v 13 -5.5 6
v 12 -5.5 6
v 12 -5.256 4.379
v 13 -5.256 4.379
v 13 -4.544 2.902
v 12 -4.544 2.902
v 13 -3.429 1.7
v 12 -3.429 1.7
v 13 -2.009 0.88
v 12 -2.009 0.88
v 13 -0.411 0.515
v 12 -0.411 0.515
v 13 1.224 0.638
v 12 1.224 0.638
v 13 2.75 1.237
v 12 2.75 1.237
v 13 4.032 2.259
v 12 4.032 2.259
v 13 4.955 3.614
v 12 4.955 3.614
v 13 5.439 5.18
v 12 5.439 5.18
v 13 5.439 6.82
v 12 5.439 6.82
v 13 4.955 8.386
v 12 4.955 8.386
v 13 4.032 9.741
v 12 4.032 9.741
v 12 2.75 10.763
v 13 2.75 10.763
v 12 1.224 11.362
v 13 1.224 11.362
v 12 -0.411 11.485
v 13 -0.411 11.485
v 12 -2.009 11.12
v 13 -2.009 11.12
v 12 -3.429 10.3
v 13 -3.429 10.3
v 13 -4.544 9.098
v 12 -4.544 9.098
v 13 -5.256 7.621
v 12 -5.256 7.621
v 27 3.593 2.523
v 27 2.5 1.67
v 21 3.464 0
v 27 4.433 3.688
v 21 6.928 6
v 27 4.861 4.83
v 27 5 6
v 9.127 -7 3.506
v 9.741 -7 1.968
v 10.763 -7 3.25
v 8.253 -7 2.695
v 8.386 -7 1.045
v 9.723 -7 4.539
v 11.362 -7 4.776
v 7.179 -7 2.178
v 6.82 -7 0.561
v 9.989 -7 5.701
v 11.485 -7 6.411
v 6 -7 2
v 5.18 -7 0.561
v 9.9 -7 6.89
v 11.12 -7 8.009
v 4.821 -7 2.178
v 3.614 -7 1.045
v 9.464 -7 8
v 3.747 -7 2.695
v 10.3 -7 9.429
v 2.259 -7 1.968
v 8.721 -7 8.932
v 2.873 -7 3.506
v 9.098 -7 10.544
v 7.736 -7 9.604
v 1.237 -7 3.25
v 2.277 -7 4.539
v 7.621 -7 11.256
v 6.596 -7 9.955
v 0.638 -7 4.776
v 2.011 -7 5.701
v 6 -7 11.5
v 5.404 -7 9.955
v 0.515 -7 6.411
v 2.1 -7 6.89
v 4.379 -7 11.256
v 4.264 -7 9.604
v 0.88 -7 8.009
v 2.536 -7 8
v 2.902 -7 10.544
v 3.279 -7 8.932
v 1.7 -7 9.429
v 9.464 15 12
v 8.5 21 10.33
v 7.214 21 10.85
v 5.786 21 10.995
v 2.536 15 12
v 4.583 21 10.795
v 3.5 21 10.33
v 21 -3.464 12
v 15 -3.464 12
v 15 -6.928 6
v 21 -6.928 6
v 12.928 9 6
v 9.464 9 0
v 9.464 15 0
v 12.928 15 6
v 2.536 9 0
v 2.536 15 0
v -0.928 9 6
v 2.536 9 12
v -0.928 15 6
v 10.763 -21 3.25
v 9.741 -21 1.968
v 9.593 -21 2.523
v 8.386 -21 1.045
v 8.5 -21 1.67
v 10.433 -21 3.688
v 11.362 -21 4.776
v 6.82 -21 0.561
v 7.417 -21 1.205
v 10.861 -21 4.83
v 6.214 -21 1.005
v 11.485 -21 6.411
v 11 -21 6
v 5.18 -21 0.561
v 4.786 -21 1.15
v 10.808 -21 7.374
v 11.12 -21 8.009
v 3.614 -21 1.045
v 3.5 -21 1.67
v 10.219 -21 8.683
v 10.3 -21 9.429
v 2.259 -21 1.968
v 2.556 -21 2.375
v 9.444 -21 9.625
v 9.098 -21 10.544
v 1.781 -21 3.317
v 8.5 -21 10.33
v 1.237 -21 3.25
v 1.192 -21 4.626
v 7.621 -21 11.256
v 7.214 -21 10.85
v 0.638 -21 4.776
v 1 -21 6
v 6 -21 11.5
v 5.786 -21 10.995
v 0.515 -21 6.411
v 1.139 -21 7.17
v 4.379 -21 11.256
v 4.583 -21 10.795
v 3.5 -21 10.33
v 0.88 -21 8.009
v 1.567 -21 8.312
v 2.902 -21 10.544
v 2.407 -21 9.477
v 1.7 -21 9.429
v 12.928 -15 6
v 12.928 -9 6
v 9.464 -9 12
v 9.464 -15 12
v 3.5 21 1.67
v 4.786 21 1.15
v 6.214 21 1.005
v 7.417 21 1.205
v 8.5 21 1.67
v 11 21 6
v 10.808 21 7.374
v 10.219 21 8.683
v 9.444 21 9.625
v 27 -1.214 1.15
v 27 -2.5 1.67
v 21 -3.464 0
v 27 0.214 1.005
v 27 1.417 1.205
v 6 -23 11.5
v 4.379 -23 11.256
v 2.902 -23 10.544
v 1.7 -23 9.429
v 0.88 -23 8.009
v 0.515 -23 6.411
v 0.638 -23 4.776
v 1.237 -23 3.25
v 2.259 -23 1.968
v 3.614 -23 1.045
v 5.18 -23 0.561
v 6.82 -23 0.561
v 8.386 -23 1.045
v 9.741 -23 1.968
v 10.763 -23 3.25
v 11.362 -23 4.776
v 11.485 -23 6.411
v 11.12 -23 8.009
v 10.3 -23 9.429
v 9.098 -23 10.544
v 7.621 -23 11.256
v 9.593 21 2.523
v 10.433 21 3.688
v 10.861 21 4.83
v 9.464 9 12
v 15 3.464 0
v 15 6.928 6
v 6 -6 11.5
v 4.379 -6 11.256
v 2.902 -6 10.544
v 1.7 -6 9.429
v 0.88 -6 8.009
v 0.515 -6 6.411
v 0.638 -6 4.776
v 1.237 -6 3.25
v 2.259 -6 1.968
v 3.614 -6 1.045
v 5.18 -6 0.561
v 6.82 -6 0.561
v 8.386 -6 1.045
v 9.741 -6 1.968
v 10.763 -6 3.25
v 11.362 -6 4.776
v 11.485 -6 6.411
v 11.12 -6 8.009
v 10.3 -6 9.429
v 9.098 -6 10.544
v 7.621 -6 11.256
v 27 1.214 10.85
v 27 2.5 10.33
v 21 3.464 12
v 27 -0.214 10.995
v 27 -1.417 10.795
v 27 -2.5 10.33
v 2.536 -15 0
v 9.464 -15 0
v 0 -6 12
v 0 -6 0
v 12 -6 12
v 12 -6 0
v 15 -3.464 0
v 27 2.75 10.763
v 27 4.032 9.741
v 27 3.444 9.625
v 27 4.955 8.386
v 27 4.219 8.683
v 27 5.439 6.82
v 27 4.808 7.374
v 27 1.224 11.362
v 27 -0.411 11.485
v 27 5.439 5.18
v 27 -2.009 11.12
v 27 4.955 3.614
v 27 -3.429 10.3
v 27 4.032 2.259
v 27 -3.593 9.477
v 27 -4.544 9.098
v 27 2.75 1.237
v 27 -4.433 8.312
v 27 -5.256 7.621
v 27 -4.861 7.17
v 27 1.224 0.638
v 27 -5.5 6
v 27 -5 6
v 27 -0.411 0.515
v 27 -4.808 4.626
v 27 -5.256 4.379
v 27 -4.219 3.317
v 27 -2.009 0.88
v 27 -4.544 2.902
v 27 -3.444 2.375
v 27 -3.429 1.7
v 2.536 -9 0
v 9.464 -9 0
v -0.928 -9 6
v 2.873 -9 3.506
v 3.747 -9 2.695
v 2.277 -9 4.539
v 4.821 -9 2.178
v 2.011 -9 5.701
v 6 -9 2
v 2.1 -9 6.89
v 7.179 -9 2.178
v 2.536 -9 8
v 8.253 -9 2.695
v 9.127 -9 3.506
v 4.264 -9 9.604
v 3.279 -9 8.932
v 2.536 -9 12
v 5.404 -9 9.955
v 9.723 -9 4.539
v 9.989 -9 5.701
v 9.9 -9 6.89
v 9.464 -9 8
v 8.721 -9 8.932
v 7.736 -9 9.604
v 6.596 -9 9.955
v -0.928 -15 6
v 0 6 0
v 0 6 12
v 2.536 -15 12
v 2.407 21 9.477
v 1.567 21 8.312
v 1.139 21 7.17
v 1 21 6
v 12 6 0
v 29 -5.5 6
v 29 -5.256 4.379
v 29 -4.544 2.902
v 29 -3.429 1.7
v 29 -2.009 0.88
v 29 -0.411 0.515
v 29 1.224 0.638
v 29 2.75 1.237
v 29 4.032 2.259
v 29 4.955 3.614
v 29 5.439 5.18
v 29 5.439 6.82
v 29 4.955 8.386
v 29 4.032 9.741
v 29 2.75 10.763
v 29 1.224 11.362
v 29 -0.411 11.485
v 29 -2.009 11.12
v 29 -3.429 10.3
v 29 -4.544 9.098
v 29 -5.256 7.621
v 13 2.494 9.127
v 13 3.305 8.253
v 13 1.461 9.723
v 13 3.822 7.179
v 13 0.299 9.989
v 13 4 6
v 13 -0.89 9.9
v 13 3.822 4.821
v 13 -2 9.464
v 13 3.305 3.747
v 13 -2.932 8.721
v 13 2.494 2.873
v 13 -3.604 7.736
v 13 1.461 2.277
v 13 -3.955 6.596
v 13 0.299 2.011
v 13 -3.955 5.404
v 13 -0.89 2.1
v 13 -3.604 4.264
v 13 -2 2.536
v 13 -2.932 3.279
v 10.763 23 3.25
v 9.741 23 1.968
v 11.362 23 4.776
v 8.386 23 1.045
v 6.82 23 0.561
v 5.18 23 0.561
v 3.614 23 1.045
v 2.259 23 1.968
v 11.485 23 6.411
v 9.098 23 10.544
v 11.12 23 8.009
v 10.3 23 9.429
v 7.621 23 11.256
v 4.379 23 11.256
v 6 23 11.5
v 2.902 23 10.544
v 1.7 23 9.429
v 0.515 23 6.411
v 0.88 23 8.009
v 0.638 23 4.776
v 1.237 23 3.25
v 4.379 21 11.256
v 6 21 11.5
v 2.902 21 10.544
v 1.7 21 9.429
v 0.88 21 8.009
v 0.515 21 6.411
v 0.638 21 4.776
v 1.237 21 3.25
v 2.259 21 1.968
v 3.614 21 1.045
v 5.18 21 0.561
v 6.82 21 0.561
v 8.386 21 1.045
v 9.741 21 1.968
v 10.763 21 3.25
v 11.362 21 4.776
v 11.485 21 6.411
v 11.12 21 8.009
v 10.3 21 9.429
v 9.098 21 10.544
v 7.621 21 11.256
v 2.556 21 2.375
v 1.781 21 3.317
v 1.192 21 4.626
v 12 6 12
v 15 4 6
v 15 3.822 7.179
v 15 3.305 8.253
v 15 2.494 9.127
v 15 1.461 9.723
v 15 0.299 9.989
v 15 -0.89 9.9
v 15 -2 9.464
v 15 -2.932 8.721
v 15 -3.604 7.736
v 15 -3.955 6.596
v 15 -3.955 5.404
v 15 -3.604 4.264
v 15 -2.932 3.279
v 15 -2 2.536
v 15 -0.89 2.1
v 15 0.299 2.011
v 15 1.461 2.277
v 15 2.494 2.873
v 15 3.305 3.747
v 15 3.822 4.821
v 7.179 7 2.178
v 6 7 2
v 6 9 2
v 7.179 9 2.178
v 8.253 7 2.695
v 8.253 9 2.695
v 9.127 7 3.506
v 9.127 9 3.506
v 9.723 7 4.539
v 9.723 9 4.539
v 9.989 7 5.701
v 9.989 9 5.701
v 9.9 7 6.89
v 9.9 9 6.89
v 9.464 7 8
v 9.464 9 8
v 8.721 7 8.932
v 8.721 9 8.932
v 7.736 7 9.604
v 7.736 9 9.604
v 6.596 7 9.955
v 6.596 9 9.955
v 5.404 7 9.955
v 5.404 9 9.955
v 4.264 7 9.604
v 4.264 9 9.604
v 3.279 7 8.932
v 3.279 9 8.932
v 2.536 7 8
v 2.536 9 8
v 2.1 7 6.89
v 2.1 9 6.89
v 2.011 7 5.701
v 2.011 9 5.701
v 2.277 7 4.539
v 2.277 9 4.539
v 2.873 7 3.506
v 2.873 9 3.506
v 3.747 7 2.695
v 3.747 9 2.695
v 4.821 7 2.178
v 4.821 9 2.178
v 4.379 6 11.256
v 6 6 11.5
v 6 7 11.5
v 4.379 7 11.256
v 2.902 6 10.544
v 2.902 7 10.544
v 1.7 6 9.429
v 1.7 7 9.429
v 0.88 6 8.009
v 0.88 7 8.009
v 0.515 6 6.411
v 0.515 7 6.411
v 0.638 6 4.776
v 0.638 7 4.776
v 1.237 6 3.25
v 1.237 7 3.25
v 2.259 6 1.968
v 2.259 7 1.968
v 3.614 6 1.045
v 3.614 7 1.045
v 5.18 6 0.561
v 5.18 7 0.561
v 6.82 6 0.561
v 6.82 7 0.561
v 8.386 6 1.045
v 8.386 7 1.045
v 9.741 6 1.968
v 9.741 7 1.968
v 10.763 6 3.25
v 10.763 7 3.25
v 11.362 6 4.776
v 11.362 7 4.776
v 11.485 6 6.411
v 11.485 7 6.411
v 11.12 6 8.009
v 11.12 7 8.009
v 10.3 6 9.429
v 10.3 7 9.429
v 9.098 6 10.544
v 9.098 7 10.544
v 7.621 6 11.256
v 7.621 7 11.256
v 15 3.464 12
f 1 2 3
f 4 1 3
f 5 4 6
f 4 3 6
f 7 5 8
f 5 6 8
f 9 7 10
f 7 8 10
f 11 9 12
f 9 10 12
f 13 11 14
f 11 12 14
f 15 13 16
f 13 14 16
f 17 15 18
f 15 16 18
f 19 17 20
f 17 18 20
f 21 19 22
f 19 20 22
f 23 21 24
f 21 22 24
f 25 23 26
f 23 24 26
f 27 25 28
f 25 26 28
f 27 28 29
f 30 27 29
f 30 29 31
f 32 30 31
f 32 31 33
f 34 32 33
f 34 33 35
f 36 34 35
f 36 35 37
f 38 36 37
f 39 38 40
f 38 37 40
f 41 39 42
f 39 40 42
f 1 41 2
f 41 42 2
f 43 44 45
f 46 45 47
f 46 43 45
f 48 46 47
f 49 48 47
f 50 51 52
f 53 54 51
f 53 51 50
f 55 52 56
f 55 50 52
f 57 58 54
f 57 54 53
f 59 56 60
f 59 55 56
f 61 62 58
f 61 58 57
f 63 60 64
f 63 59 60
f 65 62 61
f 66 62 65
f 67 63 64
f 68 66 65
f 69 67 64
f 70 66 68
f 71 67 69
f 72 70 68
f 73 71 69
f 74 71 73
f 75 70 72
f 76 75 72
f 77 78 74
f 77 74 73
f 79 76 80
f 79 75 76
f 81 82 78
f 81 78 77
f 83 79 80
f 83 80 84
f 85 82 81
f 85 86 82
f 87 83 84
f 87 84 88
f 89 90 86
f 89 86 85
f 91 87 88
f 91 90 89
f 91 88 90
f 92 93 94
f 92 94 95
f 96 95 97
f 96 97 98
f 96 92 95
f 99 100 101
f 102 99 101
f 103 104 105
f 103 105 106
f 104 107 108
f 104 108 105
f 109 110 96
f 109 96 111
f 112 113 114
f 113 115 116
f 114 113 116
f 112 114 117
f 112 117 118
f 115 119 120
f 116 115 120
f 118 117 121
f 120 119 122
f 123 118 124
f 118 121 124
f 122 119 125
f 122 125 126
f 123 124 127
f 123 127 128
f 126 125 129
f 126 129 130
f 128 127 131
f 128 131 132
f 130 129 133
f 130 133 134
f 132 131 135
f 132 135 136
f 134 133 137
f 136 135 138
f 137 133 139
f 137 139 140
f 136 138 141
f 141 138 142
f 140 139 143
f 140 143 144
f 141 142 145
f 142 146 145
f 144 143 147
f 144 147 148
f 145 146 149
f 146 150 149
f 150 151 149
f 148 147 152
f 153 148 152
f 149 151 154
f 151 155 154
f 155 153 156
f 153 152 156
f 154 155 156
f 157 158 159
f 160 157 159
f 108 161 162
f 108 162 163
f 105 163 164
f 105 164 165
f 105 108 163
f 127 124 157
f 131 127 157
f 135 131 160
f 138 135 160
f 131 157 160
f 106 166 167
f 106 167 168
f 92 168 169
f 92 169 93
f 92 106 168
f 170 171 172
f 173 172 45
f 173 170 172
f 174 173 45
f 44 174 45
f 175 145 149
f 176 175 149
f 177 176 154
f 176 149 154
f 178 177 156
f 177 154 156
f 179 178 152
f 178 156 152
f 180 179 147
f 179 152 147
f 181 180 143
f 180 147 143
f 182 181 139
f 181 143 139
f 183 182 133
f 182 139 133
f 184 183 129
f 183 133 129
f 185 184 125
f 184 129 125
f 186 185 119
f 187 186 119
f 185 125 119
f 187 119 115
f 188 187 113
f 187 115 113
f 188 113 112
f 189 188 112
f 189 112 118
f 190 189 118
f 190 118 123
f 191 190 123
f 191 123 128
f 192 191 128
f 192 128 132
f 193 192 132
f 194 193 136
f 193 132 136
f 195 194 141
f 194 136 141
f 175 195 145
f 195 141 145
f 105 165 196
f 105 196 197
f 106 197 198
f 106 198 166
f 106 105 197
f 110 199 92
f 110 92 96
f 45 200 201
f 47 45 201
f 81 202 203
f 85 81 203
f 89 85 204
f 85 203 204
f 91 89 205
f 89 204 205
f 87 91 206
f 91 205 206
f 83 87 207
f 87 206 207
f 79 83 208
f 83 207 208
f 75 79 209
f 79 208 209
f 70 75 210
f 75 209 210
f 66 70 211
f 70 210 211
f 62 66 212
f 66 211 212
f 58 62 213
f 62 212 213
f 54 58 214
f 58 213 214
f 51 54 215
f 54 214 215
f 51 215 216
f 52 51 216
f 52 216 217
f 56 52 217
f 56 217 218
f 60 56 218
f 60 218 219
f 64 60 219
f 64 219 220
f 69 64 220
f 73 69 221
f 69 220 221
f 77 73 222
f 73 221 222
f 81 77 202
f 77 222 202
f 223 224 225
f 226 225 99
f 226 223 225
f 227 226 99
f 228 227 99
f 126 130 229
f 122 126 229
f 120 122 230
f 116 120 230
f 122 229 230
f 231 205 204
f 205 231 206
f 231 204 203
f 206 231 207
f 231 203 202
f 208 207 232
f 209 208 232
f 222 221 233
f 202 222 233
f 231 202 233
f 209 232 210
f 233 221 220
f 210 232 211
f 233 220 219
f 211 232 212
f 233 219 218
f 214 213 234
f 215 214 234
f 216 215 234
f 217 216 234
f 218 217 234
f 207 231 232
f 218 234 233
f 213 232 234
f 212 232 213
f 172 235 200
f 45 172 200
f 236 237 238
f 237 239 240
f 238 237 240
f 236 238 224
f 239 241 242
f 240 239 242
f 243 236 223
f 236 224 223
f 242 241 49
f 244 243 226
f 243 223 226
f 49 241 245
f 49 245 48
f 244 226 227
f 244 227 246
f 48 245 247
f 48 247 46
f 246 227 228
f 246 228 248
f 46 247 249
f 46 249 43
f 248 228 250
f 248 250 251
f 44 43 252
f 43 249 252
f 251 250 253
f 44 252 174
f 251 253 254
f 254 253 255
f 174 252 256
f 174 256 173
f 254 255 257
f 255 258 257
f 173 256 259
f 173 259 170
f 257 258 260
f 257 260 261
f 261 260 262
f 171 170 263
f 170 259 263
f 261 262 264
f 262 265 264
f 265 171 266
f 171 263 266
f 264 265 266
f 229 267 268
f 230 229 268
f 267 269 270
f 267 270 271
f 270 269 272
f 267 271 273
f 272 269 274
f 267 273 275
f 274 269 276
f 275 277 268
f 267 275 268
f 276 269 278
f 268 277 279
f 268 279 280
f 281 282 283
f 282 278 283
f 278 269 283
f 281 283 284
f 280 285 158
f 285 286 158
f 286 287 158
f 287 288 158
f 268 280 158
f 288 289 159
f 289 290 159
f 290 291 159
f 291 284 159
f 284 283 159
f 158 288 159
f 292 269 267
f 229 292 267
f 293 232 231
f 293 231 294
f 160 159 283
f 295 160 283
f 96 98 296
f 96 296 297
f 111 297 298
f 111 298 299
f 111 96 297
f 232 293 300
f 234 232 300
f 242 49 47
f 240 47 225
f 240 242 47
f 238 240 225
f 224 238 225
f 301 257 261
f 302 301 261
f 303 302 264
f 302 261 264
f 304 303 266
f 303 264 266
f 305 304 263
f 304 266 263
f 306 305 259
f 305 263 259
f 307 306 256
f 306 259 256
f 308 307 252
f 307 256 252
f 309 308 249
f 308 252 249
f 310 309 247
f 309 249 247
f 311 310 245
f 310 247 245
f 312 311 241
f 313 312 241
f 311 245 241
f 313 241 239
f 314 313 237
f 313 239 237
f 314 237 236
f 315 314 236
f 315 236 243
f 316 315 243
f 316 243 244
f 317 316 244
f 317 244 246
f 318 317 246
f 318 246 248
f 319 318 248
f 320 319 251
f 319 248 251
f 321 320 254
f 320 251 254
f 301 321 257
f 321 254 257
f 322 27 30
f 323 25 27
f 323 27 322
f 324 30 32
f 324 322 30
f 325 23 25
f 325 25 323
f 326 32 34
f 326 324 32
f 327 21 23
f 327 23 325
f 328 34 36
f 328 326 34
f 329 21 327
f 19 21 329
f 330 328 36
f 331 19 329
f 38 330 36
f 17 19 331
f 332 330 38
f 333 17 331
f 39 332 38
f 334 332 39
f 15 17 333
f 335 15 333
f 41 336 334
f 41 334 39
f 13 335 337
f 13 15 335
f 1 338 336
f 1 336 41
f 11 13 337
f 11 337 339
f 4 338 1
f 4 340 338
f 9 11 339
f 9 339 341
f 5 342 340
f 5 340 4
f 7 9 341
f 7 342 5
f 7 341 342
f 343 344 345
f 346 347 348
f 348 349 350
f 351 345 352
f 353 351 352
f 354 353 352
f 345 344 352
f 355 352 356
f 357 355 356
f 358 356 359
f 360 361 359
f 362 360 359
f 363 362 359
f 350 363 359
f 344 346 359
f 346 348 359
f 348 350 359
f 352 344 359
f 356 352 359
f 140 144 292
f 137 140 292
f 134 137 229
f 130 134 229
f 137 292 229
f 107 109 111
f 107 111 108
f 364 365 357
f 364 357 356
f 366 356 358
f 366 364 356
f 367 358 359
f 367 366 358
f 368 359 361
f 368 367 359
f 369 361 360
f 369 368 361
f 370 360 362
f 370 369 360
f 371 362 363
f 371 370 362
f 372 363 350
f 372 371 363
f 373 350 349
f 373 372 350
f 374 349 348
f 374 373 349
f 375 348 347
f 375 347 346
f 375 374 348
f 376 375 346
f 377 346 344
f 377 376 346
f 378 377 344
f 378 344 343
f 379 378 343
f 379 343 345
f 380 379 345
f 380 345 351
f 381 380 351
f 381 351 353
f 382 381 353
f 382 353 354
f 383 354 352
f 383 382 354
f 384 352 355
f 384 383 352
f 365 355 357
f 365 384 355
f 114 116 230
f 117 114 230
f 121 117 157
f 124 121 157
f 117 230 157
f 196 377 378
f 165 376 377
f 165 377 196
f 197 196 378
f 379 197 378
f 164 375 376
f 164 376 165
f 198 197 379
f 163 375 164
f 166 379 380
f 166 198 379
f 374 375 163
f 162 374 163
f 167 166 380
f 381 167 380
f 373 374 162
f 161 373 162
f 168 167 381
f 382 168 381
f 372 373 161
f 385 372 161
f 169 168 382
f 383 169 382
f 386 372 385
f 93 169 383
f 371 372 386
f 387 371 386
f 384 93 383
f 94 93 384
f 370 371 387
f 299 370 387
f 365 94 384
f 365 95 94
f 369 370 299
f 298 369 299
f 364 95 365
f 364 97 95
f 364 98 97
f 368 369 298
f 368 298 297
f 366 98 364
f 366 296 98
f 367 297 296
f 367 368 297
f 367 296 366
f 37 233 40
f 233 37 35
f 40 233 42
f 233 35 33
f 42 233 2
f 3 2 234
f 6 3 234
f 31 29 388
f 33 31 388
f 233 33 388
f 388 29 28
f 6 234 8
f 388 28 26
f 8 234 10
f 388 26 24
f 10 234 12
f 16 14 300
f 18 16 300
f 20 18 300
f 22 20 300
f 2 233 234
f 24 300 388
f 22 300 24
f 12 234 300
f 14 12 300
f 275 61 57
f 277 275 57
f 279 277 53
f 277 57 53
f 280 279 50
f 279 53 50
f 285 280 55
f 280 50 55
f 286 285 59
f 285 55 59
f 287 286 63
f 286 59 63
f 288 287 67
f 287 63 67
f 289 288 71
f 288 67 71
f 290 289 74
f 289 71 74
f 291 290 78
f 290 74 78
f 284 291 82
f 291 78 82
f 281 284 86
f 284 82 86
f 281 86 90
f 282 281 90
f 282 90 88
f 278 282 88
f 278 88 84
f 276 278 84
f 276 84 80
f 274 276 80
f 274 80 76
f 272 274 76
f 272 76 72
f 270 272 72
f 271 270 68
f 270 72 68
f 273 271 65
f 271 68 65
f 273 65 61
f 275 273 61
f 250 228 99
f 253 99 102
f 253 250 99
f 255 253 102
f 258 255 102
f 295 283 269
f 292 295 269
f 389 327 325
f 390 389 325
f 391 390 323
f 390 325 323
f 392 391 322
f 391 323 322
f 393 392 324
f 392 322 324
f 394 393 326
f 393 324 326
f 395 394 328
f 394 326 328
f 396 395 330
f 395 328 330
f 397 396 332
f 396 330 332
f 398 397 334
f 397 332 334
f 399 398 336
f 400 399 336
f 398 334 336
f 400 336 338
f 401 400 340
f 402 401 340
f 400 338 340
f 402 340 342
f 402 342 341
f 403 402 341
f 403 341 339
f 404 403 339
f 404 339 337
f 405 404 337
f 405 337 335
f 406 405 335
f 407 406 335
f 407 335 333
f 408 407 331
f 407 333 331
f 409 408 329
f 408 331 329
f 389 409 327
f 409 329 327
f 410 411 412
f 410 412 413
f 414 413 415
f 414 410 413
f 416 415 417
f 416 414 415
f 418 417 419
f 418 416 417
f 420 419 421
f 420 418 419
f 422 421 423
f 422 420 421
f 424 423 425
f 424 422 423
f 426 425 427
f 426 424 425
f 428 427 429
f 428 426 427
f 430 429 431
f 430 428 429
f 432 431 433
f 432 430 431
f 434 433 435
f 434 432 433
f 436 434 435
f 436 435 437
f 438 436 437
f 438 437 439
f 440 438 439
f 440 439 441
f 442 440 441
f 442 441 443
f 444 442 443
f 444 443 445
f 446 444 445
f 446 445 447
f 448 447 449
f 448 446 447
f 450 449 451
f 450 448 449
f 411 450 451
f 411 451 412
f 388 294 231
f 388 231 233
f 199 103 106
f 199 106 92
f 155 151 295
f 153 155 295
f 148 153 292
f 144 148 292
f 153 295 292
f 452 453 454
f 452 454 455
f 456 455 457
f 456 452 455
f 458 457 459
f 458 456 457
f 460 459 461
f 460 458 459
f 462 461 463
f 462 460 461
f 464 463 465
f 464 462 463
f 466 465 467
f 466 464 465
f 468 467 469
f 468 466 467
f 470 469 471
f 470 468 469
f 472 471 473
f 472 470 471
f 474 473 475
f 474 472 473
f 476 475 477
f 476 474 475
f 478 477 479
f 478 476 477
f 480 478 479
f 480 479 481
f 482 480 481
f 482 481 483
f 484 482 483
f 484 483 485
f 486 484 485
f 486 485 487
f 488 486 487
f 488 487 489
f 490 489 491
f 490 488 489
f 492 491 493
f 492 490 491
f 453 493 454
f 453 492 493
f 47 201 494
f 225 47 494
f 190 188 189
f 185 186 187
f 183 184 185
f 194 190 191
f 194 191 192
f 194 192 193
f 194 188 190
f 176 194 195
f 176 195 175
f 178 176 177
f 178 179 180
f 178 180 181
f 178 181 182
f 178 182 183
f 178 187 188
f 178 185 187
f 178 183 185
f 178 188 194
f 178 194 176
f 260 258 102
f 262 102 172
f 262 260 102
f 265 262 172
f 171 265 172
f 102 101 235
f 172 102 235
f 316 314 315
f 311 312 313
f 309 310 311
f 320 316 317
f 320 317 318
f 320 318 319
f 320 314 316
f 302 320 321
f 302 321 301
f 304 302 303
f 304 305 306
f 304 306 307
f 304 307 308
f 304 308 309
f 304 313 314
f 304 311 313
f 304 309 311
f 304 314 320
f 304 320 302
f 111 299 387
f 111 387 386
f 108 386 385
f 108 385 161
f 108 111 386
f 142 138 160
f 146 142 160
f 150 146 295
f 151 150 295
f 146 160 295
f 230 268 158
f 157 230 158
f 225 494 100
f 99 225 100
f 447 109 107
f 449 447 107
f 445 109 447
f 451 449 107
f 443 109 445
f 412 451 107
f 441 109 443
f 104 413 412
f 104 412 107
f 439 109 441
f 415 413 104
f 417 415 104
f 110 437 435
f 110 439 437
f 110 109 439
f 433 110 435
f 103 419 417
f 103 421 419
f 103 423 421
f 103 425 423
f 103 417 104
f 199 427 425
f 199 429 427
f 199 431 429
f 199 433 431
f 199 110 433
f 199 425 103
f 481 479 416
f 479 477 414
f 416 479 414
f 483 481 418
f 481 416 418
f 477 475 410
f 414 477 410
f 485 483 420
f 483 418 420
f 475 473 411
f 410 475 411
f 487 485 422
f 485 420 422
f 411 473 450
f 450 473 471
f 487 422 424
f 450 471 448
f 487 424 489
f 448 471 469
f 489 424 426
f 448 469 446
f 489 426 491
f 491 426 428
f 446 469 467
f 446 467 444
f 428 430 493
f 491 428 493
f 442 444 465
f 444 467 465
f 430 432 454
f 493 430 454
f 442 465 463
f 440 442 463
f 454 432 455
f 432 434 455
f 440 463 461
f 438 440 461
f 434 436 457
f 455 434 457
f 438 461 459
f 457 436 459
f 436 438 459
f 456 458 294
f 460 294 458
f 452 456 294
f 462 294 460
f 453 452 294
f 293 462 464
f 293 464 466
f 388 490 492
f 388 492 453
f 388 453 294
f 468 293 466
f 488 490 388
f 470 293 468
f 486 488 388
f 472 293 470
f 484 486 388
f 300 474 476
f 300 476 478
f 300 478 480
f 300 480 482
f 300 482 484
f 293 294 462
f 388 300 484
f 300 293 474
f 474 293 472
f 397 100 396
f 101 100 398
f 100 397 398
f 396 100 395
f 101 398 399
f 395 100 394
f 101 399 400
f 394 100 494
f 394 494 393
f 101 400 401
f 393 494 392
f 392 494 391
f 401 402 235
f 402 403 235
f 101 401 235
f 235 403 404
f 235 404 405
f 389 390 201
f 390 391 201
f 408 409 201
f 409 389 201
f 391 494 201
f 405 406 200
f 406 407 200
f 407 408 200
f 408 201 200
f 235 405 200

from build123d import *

# Parameters (mm, degrees)
SZKIC1_W                    = 12
SZKIC1_H                    = 12
DODANIE_WYCI_GNI_CIE1_DEPTH = 12
SZKIC2_R                    = 5.5
DODANIE_WYCI_GNI_CIE2_DEPTH = 1
SZKIC3_R                    = 4
DODANIE_WYCI_GNI_CIE3_DEPTH = 2
SZKIC4_R                    = 4
DODANIE_WYCI_GNI_CIE4_DEPTH = 6
SZKIC7_R                    = 5.5
DODANIE_WYCI_GNI_CIE5_DEPTH = 2
SZKIC8_R                    = 5.5
DODANIE_WYCI_GNI_CIE6_DEPTH = 1
SZKIC9_R                    = 4
DODANIE_WYCI_GNI_CIE7_DEPTH = 2
DODANIE_WYCI_GNI_CIE8_DEPTH = 6
SZKIC13_R                   = 5.5
DODANIE_WYCI_GNI_CIE9_DEPTH = 2


with BuildPart() as part:
    # Szkic1 → Dodanie-wyciągnięcie1 (new body)
    with BuildSketch(Plane.XY):
        with Locations((6, 0)):
            Rectangle(SZKIC1_W, SZKIC1_H)
    extrude(amount=DODANIE_WYCI_GNI_CIE1_DEPTH)

    # Szkic2 → Dodanie-wyciągnięcie2 (add)
    with BuildSketch(Plane.XZ.offset(6)):
        with Locations(Location((6, 6, 0), (0, 0, 90))):
            Circle(SZKIC2_R)
    dodanie_wyci_gni_cie2 = extrude(amount=DODANIE_WYCI_GNI_CIE2_DEPTH)

    # Szkic3 → Dodanie-wyciągnięcie3 (add)
    with BuildSketch(Plane.XZ.offset(7)):
        with Locations(Location((6, 6, 0), (0, 0, 270))):
            Circle(SZKIC3_R)
    dodanie_wyci_gni_cie3 = extrude(amount=DODANIE_WYCI_GNI_CIE3_DEPTH)

    # Szkic4 → Dodanie-wyciągnięcie4 (add)
    with BuildSketch(Plane.XZ.offset(9)):
        Polygon((9.464101615, 0), (12.92820323, 6), (9.464101615, 12), (2.535898385, 12), (-0.92820323, 6), (2.535898385, 0), align=None)
        with Locations(Location((6, 6, 0), (0, 0, 270))):
            Circle(SZKIC4_R, mode=Mode.SUBTRACT)
        with Locations(Location((6, 6, 0), (0, 0, 270))):
            Circle(SZKIC4_R)
    dodanie_wyci_gni_cie4 = extrude(amount=DODANIE_WYCI_GNI_CIE4_DEPTH)

    # Szkic5 for Wyci_gni_cie → Wyciągnięcie po profilach1 section 0
    with BuildSketch(Plane(origin=(0, -21, 0), x_dir=(-1, 0, 0), z_dir=(0, -1, 0))):
        with BuildLine():
            # circular arc as an exact rational Bezier (weights 1, cos(half-angle), 1)
            Bezier((-8.5, -1.669872981), (-11, -3.113248654), (-11, -6), weights=[1, 0.866025404, 1])
            Bezier((-11, -6), (-11, -8.886751346), (-8.5, -10.330127019), weights=[1, 0.866025404, 1])
            Bezier((-8.5, -10.330127019), (-6, -11.773502692), (-3.5, -10.330127019), weights=[1, 0.866025404, 1])
            Bezier((-3.5, -10.330127019), (-1, -8.886751346), (-1, -6), weights=[1, 0.866025404, 1])
            Bezier((-1, -6), (-1, -3.113248654), (-3.5, -1.669872981), weights=[1, 0.866025404, 1])
            Bezier((-3.5, -1.669872981), (-6, -0.226497308), (-8.5, -1.669872981), weights=[1, 0.866025404, 1])
        make_face()
    # Szkic6 → Wyciągnięcie po profilach1 section 1
    with BuildSketch(Plane.XZ.offset(15)):
        Polygon((9.464101615, 0), (12.92820323, 6), (9.464101615, 12), (2.535898385, 12), (-0.92820323, 6), (2.535898385, 0), align=None)
    wyci_gni_cie_po_profilach1 = loft()

    # Szkic7 → Dodanie-wyciągnięcie5 (add)
    with BuildSketch(Plane.XZ.offset(21)):
        with Locations(Location((6, 6, 0), (0, 0, 90))):
            Circle(SZKIC7_R)
    dodanie_wyci_gni_cie5 = extrude(amount=DODANIE_WYCI_GNI_CIE5_DEPTH)

    # Lustro1: Dodanie-wyciągnięcie2, Dodanie-wyciągnięcie3, Dodanie-wyciągnięcie4, Wyciągnięcie po profilach1, Dodanie-wyciągnięcie5 across plane
    add(dodanie_wyci_gni_cie2.mirror(Plane.ZX))
    add(dodanie_wyci_gni_cie3.mirror(Plane.ZX))
    add(dodanie_wyci_gni_cie4.mirror(Plane.ZX))
    add(wyci_gni_cie_po_profilach1.mirror(Plane.ZX))
    add(dodanie_wyci_gni_cie5.mirror(Plane.ZX))

    # Szkic8 → Dodanie-wyciągnięcie6 (add)
    with BuildSketch(Plane(origin=(12, 0, 0), x_dir=(0, 0, -1), z_dir=(1, 0, 0))):
        with Locations(Location((-6, 0, 0), (0, 0, 270))):
            Circle(SZKIC8_R)
    extrude(amount=DODANIE_WYCI_GNI_CIE6_DEPTH)

    # Szkic9 → Dodanie-wyciągnięcie7 (add)
    with BuildSketch(Plane(origin=(13, 0, 0), x_dir=(0, 0, -1), z_dir=(1, 0, 0))):
        with Locations(Location((-6, 0, 0), (0, 0, 90))):
            Circle(SZKIC9_R)
    extrude(amount=DODANIE_WYCI_GNI_CIE7_DEPTH)

    # Szkic10 → Dodanie-wyciągnięcie8 (add)
    with BuildSketch(Plane(origin=(15, 0, 0), x_dir=(0, 0, -1), z_dir=(1, 0, 0))):
        Polygon((-6, 6.92820323), (-12, 3.464101615), (-12, -3.464101615), (-6, -6.92820323), (0, -3.464101615), (0, 3.464101615), align=None)
    extrude(amount=DODANIE_WYCI_GNI_CIE8_DEPTH)

    # Szkic12 → Wyciągnięcie po profilach2 section 0
    with BuildSketch(Plane(origin=(21, 0, 0), x_dir=(0, 0, -1), z_dir=(1, 0, 0))):
        Polygon((0, 3.464101615), (-6, 6.92820323), (-12, 3.464101615), (-12, -3.464101615), (-6, -6.92820323), (0, -3.464101615), align=None)
    # Szkic11 for Wyci_gni_cie → Wyciągnięcie po profilach2 section 1
    with BuildSketch(Plane(origin=(27, 0, 0), x_dir=(0, 0, -1), z_dir=(1, 0, 0))):
        with BuildLine():
            Bezier((-1.669872981, 2.5), (-3.113248654, 5), (-6, 5), weights=[1, 0.866025404, 1])
            Bezier((-6, 5), (-8.886751346, 5), (-10.330127019, 2.5), weights=[1, 0.866025404, 1])
            Bezier((-10.330127019, 2.5), (-11.773502692, 0), (-10.330127019, -2.5), weights=[1, 0.866025404, 1])
            Bezier((-10.330127019, -2.5), (-8.886751346, -5), (-6, -5), weights=[1, 0.866025404, 1])
            Bezier((-6, -5), (-3.113248654, -5), (-1.669872981, -2.5), weights=[1, 0.866025404, 1])
            Bezier((-1.669872981, -2.5), (-0.226497308, 0), (-1.669872981, 2.5), weights=[1, 0.866025404, 1])
        make_face()
    loft()

    # Szkic13 → Dodanie-wyciągnięcie9 (add)
    with BuildSketch(Plane(origin=(27, 0, 0), x_dir=(0, 0, -1), z_dir=(1, 0, 0))):
        with Locations(Location((-6, 0, 0), (0, 0, 270))):
            Circle(SZKIC13_R)
    extrude(amount=DODANIE_WYCI_GNI_CIE9_DEPTH)


solid = part.part
